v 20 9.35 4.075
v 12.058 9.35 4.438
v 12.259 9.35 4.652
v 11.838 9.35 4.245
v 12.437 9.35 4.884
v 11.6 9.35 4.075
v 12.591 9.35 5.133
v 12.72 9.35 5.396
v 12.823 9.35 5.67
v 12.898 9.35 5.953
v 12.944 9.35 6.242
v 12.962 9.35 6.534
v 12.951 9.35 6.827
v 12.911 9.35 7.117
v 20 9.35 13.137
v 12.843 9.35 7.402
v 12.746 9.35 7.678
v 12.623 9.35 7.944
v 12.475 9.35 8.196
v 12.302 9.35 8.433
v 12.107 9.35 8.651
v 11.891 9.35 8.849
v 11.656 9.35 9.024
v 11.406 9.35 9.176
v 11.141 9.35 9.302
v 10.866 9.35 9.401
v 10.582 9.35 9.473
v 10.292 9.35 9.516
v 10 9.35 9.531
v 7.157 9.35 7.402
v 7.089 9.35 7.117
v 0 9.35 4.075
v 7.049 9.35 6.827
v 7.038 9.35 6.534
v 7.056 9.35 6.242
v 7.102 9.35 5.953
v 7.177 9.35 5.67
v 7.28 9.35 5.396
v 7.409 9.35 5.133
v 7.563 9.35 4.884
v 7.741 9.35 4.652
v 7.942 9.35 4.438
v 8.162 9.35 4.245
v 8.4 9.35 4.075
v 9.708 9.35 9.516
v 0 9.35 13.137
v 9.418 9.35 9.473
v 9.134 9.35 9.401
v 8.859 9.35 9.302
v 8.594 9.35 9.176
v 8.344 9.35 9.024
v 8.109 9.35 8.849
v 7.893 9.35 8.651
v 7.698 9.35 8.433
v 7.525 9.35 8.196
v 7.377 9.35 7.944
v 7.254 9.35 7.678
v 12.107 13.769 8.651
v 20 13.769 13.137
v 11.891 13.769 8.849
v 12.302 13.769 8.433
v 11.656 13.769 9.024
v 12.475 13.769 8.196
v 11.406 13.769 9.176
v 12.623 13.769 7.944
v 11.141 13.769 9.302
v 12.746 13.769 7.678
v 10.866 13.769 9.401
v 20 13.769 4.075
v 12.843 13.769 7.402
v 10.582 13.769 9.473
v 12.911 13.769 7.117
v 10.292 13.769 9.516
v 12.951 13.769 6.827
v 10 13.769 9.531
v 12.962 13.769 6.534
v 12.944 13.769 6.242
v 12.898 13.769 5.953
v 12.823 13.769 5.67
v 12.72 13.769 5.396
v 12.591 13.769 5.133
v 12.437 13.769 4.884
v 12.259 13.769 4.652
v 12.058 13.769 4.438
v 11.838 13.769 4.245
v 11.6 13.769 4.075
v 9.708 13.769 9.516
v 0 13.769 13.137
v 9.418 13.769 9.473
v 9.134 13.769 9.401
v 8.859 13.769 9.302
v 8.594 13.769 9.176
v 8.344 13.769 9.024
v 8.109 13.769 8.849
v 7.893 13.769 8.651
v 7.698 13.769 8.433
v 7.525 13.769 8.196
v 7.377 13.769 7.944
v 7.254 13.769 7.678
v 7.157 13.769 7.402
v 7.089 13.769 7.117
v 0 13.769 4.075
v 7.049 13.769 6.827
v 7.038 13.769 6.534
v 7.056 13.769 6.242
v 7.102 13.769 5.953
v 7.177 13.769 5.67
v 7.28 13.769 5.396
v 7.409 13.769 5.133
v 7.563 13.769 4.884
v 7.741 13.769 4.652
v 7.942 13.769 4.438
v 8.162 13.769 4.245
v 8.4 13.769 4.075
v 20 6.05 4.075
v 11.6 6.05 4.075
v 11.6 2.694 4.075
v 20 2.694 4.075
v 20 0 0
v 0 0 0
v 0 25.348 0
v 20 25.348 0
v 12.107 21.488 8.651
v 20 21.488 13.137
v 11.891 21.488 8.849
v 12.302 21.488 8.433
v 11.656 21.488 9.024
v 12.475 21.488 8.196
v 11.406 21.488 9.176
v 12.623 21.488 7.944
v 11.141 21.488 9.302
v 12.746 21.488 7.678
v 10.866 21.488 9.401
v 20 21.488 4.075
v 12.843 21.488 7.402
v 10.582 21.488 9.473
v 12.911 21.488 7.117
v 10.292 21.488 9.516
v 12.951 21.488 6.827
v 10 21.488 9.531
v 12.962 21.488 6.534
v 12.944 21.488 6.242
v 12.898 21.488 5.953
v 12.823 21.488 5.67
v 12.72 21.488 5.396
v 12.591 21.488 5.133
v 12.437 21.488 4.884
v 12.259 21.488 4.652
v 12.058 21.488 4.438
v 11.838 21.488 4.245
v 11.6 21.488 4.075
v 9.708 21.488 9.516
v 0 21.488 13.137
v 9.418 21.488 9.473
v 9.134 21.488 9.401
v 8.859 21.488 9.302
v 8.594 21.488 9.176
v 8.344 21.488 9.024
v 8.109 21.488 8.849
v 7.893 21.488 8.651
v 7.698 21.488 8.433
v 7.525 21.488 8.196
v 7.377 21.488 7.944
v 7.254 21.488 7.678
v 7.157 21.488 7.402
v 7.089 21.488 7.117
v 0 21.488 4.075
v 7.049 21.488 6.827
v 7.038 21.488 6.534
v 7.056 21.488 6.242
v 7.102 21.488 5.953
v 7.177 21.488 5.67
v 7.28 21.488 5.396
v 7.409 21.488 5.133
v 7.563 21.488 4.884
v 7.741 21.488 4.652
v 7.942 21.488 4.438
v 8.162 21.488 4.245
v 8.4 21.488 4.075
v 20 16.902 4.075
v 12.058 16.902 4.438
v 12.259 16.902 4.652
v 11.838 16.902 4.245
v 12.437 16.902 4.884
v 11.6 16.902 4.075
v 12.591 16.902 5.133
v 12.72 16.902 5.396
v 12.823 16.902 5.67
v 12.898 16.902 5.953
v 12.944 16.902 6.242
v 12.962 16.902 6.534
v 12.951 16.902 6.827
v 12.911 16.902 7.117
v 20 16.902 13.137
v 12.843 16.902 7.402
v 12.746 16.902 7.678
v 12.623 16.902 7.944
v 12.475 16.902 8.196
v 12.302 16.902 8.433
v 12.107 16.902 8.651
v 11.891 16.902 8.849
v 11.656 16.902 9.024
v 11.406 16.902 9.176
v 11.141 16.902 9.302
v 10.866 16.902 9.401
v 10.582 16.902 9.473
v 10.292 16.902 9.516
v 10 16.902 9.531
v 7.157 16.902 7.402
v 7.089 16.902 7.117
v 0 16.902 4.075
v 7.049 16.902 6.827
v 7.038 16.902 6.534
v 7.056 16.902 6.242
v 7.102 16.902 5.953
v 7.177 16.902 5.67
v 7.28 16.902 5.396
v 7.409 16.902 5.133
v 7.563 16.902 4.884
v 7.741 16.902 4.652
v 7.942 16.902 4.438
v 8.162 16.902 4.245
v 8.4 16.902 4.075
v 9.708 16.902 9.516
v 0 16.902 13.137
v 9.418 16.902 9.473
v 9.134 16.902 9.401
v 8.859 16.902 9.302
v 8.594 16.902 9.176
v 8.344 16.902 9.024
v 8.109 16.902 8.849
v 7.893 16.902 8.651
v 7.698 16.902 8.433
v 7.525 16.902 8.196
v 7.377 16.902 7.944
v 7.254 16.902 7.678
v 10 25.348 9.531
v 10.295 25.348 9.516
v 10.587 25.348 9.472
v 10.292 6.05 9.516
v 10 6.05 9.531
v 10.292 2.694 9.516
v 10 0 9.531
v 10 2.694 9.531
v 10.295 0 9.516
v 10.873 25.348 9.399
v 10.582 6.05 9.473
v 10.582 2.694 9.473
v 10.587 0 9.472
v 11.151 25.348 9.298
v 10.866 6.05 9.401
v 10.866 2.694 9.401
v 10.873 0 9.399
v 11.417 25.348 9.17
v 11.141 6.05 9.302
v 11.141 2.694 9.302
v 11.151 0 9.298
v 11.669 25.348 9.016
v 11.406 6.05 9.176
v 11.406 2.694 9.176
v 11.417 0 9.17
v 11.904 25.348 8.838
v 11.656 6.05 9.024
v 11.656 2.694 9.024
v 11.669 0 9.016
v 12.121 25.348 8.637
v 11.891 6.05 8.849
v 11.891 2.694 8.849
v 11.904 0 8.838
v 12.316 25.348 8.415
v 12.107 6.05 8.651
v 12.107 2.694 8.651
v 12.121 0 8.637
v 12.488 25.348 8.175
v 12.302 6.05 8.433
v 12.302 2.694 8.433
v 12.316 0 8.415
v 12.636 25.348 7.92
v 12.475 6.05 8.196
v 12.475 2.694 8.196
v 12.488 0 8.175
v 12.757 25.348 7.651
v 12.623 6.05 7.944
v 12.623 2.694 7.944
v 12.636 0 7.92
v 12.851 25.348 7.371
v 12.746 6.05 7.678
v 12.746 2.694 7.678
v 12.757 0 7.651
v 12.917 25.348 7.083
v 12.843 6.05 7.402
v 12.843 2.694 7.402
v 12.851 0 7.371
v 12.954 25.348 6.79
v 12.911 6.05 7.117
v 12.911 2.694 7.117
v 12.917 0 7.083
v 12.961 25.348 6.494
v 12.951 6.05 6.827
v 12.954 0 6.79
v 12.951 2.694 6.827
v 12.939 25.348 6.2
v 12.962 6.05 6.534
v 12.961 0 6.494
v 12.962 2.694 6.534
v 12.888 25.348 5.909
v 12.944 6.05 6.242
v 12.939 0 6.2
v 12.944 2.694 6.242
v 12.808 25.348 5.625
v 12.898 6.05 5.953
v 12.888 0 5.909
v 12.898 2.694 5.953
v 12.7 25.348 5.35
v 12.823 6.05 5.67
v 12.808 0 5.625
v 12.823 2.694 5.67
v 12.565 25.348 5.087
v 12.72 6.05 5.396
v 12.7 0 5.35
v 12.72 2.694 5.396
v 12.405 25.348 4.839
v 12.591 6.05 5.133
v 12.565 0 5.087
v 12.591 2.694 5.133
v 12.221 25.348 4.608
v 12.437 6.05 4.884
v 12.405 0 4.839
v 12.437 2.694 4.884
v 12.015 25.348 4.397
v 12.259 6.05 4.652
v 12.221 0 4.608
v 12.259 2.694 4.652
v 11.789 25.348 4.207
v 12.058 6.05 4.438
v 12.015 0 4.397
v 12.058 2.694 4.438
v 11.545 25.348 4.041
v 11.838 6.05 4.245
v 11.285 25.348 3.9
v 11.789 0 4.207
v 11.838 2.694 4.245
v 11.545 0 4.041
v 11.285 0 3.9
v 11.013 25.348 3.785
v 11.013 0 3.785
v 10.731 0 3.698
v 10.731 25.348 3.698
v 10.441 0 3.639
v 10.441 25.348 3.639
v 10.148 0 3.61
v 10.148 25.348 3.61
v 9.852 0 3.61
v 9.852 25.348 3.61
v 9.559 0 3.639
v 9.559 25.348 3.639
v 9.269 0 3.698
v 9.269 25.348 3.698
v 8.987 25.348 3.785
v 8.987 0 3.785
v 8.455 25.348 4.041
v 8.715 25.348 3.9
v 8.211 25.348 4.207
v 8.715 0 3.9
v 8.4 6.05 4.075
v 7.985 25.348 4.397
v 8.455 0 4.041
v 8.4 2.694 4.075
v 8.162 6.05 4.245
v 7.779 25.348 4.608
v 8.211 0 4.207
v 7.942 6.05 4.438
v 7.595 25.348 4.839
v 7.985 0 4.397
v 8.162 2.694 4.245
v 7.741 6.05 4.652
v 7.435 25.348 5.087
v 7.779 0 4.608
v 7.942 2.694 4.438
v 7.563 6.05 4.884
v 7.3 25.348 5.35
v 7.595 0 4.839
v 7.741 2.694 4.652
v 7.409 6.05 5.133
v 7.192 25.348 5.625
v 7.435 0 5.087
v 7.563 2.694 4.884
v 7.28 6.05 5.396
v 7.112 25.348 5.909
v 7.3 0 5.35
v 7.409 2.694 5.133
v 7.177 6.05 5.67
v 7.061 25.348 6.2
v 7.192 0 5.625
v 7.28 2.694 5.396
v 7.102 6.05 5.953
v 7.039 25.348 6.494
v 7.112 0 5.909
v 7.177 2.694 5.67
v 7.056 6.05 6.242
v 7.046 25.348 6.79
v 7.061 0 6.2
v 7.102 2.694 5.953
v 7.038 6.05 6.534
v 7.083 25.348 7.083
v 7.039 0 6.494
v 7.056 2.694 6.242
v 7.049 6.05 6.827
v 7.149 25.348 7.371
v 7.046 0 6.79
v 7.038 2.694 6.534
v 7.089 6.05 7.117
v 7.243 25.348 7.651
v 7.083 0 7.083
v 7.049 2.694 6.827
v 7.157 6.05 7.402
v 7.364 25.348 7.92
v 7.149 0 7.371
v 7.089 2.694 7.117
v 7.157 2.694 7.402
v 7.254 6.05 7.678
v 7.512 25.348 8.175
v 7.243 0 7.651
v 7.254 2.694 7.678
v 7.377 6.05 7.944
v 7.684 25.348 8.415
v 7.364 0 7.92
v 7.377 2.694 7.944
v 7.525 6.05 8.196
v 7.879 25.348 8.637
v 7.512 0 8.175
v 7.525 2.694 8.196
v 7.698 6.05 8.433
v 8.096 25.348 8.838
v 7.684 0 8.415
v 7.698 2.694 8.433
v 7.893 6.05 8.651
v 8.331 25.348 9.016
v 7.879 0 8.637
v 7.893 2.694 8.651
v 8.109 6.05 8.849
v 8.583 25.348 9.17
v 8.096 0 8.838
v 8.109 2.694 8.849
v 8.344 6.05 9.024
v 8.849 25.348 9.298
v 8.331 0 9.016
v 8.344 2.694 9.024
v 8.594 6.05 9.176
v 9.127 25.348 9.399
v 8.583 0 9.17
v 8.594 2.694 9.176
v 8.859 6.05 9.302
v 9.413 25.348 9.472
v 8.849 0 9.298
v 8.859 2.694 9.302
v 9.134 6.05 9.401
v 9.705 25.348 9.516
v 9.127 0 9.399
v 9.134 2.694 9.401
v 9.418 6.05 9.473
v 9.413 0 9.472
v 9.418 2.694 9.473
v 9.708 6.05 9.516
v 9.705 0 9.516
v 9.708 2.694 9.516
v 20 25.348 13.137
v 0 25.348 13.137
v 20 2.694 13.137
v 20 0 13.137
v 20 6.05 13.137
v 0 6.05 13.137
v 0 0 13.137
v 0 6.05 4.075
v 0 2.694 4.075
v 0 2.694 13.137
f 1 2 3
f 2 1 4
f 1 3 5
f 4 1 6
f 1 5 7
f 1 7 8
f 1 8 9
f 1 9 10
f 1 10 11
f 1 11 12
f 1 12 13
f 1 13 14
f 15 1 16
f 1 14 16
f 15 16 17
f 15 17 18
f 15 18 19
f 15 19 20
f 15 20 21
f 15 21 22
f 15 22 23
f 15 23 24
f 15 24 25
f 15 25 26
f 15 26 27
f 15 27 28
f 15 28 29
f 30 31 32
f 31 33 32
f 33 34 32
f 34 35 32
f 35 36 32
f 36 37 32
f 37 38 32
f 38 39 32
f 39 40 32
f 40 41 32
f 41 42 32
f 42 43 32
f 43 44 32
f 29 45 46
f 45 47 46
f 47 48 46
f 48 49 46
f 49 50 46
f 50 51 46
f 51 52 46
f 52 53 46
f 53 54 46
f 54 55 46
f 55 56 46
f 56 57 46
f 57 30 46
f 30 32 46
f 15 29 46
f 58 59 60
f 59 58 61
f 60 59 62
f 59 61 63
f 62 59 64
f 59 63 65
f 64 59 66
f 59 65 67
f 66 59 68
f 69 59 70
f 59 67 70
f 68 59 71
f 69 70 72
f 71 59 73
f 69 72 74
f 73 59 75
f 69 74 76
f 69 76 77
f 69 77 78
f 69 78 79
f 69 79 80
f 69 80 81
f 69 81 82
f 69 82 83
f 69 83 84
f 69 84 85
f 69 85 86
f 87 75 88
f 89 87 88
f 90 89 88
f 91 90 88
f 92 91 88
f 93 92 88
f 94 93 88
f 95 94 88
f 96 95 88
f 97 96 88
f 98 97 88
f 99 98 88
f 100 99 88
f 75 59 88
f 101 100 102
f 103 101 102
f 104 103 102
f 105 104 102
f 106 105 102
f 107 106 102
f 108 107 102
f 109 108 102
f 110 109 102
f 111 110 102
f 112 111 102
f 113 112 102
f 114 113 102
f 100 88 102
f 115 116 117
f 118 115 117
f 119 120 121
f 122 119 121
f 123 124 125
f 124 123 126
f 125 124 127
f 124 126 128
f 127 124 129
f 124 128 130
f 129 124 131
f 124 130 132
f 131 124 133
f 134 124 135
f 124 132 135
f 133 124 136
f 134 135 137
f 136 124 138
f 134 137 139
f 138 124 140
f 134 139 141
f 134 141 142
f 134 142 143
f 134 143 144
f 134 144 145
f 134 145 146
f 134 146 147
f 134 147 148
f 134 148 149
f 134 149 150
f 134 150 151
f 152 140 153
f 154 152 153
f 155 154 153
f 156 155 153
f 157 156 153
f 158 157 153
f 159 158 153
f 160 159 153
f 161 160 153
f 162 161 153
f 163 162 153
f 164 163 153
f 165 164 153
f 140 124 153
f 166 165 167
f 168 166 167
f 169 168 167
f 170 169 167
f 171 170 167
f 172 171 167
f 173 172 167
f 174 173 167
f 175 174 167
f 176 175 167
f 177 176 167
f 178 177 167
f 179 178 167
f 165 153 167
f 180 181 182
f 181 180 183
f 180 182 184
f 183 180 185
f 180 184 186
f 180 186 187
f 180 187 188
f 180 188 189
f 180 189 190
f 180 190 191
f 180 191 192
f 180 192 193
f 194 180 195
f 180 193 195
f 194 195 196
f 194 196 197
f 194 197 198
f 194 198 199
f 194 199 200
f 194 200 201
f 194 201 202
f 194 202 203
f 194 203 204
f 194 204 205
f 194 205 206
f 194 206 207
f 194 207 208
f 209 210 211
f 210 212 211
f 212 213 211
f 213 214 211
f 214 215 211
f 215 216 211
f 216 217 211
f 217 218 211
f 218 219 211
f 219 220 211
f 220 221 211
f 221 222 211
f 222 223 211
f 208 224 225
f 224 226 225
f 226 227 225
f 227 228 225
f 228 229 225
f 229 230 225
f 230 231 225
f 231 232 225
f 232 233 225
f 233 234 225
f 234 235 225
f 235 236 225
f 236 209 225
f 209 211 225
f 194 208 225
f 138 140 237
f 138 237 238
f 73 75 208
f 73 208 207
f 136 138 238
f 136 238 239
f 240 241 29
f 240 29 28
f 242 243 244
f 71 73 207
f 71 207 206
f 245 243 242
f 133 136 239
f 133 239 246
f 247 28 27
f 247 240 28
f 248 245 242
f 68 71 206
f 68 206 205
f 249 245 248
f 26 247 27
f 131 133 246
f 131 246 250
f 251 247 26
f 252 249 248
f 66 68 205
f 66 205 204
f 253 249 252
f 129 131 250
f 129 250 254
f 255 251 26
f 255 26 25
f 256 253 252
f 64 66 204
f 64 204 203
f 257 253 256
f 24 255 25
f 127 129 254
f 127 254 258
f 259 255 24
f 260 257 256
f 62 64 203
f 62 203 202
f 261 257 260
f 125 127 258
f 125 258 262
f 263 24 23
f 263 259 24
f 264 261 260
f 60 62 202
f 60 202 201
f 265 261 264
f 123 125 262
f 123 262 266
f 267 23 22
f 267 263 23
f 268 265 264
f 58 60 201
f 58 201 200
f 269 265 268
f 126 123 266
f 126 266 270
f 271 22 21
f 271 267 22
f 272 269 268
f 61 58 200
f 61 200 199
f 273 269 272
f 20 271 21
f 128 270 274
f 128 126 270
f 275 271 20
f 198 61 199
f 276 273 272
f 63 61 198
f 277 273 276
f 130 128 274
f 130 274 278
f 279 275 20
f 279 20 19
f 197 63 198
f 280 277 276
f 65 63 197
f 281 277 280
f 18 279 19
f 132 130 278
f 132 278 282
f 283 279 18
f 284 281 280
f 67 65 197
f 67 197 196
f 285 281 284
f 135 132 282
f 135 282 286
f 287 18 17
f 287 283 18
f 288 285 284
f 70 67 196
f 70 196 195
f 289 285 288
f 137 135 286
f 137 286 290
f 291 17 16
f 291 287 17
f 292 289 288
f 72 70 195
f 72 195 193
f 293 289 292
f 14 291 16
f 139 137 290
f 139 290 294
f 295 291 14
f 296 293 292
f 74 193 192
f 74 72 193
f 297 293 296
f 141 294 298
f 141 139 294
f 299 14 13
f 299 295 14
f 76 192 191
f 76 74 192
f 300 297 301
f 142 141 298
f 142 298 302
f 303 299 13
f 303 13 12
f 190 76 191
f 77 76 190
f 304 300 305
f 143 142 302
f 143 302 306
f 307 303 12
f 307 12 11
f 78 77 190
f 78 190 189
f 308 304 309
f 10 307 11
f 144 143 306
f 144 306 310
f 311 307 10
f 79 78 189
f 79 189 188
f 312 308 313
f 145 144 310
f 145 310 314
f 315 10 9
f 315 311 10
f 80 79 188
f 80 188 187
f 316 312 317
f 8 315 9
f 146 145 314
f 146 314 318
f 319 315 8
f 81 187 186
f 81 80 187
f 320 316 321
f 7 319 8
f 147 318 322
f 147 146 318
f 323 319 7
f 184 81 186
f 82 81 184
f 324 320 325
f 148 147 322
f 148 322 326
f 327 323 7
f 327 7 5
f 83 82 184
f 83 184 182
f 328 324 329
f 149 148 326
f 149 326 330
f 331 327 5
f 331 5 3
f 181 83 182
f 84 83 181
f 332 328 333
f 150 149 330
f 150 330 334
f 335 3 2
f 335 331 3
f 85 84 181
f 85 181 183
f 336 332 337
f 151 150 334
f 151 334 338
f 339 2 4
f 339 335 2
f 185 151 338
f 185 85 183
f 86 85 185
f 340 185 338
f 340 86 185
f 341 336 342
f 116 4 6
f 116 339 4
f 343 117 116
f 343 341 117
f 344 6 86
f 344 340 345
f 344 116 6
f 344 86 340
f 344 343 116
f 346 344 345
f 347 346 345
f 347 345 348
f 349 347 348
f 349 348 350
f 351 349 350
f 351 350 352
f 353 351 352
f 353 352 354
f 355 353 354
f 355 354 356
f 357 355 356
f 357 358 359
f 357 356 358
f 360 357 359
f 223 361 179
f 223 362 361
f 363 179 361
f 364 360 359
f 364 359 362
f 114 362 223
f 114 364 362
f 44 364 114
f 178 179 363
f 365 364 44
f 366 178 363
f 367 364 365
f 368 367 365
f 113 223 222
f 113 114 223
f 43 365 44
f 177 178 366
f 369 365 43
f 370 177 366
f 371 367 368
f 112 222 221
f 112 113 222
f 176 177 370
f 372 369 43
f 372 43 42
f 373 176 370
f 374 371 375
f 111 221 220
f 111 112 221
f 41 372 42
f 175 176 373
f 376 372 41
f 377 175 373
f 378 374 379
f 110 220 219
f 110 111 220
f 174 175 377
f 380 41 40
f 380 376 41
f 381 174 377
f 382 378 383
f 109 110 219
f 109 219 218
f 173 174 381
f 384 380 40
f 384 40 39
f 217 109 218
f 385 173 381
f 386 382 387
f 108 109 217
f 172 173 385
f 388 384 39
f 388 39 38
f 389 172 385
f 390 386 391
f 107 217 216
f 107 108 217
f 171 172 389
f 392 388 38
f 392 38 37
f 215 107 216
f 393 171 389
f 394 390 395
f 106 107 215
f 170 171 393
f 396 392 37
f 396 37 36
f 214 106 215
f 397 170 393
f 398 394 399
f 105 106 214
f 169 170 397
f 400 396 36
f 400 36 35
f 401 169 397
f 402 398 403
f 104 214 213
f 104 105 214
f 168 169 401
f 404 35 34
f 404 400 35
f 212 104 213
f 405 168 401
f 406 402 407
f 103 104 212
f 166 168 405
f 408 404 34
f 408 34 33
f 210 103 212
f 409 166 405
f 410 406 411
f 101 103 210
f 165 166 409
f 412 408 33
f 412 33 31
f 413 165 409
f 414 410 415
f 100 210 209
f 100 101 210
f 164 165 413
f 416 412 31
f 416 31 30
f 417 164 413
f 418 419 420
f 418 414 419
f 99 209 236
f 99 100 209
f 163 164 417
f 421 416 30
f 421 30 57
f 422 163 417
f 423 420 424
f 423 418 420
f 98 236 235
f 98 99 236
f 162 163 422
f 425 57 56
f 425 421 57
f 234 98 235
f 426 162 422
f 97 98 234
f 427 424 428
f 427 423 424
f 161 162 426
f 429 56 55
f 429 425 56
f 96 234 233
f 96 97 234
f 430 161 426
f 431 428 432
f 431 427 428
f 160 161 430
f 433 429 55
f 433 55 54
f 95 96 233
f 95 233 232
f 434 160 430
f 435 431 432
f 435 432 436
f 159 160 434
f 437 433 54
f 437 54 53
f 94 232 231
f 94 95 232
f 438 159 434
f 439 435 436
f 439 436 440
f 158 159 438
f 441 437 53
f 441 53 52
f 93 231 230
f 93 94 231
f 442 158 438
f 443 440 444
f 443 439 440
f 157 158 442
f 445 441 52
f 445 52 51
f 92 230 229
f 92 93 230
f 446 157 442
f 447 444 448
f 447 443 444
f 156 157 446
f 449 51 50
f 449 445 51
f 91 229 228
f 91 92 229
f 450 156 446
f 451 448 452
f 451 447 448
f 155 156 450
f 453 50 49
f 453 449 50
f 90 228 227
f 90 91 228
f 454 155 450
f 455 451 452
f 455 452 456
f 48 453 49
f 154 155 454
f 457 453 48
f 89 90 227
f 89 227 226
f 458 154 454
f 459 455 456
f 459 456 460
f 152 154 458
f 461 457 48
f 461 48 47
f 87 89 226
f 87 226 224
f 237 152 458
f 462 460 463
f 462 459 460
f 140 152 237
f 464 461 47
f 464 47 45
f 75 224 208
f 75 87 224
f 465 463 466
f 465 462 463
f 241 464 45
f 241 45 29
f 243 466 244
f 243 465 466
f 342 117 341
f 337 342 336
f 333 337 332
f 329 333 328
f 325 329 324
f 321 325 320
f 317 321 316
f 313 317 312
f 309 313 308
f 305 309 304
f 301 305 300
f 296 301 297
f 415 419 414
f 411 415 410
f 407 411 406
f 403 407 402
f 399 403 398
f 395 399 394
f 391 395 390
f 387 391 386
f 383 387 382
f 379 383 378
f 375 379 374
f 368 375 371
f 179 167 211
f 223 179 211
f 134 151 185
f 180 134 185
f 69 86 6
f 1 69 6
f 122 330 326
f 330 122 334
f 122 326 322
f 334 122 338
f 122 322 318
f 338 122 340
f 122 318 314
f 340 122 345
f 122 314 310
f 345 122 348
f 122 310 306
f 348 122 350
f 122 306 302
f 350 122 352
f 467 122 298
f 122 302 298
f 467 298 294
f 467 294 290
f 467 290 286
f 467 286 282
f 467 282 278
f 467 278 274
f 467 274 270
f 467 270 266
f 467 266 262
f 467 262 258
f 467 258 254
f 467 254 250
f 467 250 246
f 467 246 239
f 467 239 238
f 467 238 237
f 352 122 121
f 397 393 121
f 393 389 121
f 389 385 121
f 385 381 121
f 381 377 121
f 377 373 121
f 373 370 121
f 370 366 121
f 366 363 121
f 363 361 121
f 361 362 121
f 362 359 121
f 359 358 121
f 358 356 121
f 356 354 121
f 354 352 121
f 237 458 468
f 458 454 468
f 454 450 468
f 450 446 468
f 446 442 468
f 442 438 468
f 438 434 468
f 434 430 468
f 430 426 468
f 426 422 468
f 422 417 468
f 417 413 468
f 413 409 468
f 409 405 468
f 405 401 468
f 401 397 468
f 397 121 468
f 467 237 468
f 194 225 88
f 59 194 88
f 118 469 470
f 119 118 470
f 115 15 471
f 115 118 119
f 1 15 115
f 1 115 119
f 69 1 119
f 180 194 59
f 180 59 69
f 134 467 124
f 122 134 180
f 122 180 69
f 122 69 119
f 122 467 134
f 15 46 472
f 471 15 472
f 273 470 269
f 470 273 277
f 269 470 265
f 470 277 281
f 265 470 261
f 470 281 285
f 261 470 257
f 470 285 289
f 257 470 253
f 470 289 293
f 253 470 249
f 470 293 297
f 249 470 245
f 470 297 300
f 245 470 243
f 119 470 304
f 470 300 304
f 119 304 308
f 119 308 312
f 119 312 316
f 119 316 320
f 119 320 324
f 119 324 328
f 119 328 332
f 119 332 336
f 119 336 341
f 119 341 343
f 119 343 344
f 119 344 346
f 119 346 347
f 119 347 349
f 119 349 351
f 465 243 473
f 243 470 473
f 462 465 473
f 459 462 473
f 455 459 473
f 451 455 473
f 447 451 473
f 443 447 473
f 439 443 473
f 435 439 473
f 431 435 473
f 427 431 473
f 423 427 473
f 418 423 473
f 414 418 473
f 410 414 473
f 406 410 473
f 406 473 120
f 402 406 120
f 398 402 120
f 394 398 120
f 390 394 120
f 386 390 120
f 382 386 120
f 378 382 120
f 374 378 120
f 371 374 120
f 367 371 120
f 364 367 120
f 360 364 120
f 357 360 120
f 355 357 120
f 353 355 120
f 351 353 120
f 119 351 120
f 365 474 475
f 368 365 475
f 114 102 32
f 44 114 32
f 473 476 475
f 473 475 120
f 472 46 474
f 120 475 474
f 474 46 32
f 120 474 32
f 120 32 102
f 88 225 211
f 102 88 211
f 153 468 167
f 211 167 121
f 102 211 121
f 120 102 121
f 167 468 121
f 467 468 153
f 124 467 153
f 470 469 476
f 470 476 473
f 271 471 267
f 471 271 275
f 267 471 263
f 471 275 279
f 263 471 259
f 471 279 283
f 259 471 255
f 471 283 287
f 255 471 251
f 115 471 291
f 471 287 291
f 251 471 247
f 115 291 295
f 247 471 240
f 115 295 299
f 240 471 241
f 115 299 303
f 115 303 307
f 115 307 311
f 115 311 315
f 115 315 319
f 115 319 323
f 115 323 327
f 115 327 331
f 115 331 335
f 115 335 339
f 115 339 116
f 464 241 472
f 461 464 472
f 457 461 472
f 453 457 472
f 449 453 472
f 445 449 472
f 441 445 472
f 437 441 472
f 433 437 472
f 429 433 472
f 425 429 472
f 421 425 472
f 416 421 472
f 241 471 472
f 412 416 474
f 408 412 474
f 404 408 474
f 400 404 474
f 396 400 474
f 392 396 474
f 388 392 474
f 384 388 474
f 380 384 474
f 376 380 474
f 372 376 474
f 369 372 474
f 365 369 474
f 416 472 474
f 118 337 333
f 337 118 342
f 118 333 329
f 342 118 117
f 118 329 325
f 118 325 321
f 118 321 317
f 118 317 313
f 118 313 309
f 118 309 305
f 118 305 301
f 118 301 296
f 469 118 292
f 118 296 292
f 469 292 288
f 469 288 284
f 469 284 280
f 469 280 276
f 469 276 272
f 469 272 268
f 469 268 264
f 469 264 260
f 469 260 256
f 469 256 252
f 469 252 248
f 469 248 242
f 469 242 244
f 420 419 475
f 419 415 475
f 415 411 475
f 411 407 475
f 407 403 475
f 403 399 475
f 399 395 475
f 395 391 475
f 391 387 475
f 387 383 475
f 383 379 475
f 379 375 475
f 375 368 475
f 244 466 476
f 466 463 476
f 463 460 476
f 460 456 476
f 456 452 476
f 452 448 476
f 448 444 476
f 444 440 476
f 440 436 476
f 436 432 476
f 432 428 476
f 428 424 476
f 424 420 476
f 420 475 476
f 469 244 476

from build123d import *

# Parameters (mm, degrees)
BOSS_EXTRUDE2_DEPTH     = 20
CUT_EXTRUDE1_DEPTH      = 35.858058648
CUT_EXTRUDE1_DEPTH_BACK = 35.858058648
SKETCH3_R               = 2.962169801


with BuildPart() as part:
    # Sketch2 → Boss-Extrude2 (new body)
    with BuildSketch(Plane(origin=(0, 0, 0), x_dir=(0, 0, -1), z_dir=(1, 0, 0))):
        Polygon((0, 0), (0, 25.347810212), (-13.136695555, 25.347810212), (-13.136695555, 21.488272358), (-4.075171897, 21.488272358), (-4.075171897, 16.901575198), (-13.136695555, 16.901575198), (-13.136695555, 13.76919665), (-4.075171897, 13.76919665), (-4.075171897, 9.350305483), (-13.136695555, 9.350305483), (-13.136695555, 6.050120941), (-4.075171897, 6.050120941), (-4.075171897, 2.694001068), (-13.136695555, 2.694001068), (-13.136695555, 0), align=None)
    extrude(amount=BOSS_EXTRUDE2_DEPTH)

    # Sketch3 → Cut-Extrude1 (cut, two sides: drawn at the far end of the back side and taken through both)
    with BuildSketch(Plane(origin=(0, 25.347810212, 0), x_dir=(1, 0, 0), z_dir=(0, 1, 0)).offset(-CUT_EXTRUDE1_DEPTH_BACK)):
        with Locations(Location((10, -6.568347778, 0), (0, 0, 270))):
            Circle(SKETCH3_R)
    extrude(amount=CUT_EXTRUDE1_DEPTH + CUT_EXTRUDE1_DEPTH_BACK, mode=Mode.SUBTRACT)


solid = part.part
